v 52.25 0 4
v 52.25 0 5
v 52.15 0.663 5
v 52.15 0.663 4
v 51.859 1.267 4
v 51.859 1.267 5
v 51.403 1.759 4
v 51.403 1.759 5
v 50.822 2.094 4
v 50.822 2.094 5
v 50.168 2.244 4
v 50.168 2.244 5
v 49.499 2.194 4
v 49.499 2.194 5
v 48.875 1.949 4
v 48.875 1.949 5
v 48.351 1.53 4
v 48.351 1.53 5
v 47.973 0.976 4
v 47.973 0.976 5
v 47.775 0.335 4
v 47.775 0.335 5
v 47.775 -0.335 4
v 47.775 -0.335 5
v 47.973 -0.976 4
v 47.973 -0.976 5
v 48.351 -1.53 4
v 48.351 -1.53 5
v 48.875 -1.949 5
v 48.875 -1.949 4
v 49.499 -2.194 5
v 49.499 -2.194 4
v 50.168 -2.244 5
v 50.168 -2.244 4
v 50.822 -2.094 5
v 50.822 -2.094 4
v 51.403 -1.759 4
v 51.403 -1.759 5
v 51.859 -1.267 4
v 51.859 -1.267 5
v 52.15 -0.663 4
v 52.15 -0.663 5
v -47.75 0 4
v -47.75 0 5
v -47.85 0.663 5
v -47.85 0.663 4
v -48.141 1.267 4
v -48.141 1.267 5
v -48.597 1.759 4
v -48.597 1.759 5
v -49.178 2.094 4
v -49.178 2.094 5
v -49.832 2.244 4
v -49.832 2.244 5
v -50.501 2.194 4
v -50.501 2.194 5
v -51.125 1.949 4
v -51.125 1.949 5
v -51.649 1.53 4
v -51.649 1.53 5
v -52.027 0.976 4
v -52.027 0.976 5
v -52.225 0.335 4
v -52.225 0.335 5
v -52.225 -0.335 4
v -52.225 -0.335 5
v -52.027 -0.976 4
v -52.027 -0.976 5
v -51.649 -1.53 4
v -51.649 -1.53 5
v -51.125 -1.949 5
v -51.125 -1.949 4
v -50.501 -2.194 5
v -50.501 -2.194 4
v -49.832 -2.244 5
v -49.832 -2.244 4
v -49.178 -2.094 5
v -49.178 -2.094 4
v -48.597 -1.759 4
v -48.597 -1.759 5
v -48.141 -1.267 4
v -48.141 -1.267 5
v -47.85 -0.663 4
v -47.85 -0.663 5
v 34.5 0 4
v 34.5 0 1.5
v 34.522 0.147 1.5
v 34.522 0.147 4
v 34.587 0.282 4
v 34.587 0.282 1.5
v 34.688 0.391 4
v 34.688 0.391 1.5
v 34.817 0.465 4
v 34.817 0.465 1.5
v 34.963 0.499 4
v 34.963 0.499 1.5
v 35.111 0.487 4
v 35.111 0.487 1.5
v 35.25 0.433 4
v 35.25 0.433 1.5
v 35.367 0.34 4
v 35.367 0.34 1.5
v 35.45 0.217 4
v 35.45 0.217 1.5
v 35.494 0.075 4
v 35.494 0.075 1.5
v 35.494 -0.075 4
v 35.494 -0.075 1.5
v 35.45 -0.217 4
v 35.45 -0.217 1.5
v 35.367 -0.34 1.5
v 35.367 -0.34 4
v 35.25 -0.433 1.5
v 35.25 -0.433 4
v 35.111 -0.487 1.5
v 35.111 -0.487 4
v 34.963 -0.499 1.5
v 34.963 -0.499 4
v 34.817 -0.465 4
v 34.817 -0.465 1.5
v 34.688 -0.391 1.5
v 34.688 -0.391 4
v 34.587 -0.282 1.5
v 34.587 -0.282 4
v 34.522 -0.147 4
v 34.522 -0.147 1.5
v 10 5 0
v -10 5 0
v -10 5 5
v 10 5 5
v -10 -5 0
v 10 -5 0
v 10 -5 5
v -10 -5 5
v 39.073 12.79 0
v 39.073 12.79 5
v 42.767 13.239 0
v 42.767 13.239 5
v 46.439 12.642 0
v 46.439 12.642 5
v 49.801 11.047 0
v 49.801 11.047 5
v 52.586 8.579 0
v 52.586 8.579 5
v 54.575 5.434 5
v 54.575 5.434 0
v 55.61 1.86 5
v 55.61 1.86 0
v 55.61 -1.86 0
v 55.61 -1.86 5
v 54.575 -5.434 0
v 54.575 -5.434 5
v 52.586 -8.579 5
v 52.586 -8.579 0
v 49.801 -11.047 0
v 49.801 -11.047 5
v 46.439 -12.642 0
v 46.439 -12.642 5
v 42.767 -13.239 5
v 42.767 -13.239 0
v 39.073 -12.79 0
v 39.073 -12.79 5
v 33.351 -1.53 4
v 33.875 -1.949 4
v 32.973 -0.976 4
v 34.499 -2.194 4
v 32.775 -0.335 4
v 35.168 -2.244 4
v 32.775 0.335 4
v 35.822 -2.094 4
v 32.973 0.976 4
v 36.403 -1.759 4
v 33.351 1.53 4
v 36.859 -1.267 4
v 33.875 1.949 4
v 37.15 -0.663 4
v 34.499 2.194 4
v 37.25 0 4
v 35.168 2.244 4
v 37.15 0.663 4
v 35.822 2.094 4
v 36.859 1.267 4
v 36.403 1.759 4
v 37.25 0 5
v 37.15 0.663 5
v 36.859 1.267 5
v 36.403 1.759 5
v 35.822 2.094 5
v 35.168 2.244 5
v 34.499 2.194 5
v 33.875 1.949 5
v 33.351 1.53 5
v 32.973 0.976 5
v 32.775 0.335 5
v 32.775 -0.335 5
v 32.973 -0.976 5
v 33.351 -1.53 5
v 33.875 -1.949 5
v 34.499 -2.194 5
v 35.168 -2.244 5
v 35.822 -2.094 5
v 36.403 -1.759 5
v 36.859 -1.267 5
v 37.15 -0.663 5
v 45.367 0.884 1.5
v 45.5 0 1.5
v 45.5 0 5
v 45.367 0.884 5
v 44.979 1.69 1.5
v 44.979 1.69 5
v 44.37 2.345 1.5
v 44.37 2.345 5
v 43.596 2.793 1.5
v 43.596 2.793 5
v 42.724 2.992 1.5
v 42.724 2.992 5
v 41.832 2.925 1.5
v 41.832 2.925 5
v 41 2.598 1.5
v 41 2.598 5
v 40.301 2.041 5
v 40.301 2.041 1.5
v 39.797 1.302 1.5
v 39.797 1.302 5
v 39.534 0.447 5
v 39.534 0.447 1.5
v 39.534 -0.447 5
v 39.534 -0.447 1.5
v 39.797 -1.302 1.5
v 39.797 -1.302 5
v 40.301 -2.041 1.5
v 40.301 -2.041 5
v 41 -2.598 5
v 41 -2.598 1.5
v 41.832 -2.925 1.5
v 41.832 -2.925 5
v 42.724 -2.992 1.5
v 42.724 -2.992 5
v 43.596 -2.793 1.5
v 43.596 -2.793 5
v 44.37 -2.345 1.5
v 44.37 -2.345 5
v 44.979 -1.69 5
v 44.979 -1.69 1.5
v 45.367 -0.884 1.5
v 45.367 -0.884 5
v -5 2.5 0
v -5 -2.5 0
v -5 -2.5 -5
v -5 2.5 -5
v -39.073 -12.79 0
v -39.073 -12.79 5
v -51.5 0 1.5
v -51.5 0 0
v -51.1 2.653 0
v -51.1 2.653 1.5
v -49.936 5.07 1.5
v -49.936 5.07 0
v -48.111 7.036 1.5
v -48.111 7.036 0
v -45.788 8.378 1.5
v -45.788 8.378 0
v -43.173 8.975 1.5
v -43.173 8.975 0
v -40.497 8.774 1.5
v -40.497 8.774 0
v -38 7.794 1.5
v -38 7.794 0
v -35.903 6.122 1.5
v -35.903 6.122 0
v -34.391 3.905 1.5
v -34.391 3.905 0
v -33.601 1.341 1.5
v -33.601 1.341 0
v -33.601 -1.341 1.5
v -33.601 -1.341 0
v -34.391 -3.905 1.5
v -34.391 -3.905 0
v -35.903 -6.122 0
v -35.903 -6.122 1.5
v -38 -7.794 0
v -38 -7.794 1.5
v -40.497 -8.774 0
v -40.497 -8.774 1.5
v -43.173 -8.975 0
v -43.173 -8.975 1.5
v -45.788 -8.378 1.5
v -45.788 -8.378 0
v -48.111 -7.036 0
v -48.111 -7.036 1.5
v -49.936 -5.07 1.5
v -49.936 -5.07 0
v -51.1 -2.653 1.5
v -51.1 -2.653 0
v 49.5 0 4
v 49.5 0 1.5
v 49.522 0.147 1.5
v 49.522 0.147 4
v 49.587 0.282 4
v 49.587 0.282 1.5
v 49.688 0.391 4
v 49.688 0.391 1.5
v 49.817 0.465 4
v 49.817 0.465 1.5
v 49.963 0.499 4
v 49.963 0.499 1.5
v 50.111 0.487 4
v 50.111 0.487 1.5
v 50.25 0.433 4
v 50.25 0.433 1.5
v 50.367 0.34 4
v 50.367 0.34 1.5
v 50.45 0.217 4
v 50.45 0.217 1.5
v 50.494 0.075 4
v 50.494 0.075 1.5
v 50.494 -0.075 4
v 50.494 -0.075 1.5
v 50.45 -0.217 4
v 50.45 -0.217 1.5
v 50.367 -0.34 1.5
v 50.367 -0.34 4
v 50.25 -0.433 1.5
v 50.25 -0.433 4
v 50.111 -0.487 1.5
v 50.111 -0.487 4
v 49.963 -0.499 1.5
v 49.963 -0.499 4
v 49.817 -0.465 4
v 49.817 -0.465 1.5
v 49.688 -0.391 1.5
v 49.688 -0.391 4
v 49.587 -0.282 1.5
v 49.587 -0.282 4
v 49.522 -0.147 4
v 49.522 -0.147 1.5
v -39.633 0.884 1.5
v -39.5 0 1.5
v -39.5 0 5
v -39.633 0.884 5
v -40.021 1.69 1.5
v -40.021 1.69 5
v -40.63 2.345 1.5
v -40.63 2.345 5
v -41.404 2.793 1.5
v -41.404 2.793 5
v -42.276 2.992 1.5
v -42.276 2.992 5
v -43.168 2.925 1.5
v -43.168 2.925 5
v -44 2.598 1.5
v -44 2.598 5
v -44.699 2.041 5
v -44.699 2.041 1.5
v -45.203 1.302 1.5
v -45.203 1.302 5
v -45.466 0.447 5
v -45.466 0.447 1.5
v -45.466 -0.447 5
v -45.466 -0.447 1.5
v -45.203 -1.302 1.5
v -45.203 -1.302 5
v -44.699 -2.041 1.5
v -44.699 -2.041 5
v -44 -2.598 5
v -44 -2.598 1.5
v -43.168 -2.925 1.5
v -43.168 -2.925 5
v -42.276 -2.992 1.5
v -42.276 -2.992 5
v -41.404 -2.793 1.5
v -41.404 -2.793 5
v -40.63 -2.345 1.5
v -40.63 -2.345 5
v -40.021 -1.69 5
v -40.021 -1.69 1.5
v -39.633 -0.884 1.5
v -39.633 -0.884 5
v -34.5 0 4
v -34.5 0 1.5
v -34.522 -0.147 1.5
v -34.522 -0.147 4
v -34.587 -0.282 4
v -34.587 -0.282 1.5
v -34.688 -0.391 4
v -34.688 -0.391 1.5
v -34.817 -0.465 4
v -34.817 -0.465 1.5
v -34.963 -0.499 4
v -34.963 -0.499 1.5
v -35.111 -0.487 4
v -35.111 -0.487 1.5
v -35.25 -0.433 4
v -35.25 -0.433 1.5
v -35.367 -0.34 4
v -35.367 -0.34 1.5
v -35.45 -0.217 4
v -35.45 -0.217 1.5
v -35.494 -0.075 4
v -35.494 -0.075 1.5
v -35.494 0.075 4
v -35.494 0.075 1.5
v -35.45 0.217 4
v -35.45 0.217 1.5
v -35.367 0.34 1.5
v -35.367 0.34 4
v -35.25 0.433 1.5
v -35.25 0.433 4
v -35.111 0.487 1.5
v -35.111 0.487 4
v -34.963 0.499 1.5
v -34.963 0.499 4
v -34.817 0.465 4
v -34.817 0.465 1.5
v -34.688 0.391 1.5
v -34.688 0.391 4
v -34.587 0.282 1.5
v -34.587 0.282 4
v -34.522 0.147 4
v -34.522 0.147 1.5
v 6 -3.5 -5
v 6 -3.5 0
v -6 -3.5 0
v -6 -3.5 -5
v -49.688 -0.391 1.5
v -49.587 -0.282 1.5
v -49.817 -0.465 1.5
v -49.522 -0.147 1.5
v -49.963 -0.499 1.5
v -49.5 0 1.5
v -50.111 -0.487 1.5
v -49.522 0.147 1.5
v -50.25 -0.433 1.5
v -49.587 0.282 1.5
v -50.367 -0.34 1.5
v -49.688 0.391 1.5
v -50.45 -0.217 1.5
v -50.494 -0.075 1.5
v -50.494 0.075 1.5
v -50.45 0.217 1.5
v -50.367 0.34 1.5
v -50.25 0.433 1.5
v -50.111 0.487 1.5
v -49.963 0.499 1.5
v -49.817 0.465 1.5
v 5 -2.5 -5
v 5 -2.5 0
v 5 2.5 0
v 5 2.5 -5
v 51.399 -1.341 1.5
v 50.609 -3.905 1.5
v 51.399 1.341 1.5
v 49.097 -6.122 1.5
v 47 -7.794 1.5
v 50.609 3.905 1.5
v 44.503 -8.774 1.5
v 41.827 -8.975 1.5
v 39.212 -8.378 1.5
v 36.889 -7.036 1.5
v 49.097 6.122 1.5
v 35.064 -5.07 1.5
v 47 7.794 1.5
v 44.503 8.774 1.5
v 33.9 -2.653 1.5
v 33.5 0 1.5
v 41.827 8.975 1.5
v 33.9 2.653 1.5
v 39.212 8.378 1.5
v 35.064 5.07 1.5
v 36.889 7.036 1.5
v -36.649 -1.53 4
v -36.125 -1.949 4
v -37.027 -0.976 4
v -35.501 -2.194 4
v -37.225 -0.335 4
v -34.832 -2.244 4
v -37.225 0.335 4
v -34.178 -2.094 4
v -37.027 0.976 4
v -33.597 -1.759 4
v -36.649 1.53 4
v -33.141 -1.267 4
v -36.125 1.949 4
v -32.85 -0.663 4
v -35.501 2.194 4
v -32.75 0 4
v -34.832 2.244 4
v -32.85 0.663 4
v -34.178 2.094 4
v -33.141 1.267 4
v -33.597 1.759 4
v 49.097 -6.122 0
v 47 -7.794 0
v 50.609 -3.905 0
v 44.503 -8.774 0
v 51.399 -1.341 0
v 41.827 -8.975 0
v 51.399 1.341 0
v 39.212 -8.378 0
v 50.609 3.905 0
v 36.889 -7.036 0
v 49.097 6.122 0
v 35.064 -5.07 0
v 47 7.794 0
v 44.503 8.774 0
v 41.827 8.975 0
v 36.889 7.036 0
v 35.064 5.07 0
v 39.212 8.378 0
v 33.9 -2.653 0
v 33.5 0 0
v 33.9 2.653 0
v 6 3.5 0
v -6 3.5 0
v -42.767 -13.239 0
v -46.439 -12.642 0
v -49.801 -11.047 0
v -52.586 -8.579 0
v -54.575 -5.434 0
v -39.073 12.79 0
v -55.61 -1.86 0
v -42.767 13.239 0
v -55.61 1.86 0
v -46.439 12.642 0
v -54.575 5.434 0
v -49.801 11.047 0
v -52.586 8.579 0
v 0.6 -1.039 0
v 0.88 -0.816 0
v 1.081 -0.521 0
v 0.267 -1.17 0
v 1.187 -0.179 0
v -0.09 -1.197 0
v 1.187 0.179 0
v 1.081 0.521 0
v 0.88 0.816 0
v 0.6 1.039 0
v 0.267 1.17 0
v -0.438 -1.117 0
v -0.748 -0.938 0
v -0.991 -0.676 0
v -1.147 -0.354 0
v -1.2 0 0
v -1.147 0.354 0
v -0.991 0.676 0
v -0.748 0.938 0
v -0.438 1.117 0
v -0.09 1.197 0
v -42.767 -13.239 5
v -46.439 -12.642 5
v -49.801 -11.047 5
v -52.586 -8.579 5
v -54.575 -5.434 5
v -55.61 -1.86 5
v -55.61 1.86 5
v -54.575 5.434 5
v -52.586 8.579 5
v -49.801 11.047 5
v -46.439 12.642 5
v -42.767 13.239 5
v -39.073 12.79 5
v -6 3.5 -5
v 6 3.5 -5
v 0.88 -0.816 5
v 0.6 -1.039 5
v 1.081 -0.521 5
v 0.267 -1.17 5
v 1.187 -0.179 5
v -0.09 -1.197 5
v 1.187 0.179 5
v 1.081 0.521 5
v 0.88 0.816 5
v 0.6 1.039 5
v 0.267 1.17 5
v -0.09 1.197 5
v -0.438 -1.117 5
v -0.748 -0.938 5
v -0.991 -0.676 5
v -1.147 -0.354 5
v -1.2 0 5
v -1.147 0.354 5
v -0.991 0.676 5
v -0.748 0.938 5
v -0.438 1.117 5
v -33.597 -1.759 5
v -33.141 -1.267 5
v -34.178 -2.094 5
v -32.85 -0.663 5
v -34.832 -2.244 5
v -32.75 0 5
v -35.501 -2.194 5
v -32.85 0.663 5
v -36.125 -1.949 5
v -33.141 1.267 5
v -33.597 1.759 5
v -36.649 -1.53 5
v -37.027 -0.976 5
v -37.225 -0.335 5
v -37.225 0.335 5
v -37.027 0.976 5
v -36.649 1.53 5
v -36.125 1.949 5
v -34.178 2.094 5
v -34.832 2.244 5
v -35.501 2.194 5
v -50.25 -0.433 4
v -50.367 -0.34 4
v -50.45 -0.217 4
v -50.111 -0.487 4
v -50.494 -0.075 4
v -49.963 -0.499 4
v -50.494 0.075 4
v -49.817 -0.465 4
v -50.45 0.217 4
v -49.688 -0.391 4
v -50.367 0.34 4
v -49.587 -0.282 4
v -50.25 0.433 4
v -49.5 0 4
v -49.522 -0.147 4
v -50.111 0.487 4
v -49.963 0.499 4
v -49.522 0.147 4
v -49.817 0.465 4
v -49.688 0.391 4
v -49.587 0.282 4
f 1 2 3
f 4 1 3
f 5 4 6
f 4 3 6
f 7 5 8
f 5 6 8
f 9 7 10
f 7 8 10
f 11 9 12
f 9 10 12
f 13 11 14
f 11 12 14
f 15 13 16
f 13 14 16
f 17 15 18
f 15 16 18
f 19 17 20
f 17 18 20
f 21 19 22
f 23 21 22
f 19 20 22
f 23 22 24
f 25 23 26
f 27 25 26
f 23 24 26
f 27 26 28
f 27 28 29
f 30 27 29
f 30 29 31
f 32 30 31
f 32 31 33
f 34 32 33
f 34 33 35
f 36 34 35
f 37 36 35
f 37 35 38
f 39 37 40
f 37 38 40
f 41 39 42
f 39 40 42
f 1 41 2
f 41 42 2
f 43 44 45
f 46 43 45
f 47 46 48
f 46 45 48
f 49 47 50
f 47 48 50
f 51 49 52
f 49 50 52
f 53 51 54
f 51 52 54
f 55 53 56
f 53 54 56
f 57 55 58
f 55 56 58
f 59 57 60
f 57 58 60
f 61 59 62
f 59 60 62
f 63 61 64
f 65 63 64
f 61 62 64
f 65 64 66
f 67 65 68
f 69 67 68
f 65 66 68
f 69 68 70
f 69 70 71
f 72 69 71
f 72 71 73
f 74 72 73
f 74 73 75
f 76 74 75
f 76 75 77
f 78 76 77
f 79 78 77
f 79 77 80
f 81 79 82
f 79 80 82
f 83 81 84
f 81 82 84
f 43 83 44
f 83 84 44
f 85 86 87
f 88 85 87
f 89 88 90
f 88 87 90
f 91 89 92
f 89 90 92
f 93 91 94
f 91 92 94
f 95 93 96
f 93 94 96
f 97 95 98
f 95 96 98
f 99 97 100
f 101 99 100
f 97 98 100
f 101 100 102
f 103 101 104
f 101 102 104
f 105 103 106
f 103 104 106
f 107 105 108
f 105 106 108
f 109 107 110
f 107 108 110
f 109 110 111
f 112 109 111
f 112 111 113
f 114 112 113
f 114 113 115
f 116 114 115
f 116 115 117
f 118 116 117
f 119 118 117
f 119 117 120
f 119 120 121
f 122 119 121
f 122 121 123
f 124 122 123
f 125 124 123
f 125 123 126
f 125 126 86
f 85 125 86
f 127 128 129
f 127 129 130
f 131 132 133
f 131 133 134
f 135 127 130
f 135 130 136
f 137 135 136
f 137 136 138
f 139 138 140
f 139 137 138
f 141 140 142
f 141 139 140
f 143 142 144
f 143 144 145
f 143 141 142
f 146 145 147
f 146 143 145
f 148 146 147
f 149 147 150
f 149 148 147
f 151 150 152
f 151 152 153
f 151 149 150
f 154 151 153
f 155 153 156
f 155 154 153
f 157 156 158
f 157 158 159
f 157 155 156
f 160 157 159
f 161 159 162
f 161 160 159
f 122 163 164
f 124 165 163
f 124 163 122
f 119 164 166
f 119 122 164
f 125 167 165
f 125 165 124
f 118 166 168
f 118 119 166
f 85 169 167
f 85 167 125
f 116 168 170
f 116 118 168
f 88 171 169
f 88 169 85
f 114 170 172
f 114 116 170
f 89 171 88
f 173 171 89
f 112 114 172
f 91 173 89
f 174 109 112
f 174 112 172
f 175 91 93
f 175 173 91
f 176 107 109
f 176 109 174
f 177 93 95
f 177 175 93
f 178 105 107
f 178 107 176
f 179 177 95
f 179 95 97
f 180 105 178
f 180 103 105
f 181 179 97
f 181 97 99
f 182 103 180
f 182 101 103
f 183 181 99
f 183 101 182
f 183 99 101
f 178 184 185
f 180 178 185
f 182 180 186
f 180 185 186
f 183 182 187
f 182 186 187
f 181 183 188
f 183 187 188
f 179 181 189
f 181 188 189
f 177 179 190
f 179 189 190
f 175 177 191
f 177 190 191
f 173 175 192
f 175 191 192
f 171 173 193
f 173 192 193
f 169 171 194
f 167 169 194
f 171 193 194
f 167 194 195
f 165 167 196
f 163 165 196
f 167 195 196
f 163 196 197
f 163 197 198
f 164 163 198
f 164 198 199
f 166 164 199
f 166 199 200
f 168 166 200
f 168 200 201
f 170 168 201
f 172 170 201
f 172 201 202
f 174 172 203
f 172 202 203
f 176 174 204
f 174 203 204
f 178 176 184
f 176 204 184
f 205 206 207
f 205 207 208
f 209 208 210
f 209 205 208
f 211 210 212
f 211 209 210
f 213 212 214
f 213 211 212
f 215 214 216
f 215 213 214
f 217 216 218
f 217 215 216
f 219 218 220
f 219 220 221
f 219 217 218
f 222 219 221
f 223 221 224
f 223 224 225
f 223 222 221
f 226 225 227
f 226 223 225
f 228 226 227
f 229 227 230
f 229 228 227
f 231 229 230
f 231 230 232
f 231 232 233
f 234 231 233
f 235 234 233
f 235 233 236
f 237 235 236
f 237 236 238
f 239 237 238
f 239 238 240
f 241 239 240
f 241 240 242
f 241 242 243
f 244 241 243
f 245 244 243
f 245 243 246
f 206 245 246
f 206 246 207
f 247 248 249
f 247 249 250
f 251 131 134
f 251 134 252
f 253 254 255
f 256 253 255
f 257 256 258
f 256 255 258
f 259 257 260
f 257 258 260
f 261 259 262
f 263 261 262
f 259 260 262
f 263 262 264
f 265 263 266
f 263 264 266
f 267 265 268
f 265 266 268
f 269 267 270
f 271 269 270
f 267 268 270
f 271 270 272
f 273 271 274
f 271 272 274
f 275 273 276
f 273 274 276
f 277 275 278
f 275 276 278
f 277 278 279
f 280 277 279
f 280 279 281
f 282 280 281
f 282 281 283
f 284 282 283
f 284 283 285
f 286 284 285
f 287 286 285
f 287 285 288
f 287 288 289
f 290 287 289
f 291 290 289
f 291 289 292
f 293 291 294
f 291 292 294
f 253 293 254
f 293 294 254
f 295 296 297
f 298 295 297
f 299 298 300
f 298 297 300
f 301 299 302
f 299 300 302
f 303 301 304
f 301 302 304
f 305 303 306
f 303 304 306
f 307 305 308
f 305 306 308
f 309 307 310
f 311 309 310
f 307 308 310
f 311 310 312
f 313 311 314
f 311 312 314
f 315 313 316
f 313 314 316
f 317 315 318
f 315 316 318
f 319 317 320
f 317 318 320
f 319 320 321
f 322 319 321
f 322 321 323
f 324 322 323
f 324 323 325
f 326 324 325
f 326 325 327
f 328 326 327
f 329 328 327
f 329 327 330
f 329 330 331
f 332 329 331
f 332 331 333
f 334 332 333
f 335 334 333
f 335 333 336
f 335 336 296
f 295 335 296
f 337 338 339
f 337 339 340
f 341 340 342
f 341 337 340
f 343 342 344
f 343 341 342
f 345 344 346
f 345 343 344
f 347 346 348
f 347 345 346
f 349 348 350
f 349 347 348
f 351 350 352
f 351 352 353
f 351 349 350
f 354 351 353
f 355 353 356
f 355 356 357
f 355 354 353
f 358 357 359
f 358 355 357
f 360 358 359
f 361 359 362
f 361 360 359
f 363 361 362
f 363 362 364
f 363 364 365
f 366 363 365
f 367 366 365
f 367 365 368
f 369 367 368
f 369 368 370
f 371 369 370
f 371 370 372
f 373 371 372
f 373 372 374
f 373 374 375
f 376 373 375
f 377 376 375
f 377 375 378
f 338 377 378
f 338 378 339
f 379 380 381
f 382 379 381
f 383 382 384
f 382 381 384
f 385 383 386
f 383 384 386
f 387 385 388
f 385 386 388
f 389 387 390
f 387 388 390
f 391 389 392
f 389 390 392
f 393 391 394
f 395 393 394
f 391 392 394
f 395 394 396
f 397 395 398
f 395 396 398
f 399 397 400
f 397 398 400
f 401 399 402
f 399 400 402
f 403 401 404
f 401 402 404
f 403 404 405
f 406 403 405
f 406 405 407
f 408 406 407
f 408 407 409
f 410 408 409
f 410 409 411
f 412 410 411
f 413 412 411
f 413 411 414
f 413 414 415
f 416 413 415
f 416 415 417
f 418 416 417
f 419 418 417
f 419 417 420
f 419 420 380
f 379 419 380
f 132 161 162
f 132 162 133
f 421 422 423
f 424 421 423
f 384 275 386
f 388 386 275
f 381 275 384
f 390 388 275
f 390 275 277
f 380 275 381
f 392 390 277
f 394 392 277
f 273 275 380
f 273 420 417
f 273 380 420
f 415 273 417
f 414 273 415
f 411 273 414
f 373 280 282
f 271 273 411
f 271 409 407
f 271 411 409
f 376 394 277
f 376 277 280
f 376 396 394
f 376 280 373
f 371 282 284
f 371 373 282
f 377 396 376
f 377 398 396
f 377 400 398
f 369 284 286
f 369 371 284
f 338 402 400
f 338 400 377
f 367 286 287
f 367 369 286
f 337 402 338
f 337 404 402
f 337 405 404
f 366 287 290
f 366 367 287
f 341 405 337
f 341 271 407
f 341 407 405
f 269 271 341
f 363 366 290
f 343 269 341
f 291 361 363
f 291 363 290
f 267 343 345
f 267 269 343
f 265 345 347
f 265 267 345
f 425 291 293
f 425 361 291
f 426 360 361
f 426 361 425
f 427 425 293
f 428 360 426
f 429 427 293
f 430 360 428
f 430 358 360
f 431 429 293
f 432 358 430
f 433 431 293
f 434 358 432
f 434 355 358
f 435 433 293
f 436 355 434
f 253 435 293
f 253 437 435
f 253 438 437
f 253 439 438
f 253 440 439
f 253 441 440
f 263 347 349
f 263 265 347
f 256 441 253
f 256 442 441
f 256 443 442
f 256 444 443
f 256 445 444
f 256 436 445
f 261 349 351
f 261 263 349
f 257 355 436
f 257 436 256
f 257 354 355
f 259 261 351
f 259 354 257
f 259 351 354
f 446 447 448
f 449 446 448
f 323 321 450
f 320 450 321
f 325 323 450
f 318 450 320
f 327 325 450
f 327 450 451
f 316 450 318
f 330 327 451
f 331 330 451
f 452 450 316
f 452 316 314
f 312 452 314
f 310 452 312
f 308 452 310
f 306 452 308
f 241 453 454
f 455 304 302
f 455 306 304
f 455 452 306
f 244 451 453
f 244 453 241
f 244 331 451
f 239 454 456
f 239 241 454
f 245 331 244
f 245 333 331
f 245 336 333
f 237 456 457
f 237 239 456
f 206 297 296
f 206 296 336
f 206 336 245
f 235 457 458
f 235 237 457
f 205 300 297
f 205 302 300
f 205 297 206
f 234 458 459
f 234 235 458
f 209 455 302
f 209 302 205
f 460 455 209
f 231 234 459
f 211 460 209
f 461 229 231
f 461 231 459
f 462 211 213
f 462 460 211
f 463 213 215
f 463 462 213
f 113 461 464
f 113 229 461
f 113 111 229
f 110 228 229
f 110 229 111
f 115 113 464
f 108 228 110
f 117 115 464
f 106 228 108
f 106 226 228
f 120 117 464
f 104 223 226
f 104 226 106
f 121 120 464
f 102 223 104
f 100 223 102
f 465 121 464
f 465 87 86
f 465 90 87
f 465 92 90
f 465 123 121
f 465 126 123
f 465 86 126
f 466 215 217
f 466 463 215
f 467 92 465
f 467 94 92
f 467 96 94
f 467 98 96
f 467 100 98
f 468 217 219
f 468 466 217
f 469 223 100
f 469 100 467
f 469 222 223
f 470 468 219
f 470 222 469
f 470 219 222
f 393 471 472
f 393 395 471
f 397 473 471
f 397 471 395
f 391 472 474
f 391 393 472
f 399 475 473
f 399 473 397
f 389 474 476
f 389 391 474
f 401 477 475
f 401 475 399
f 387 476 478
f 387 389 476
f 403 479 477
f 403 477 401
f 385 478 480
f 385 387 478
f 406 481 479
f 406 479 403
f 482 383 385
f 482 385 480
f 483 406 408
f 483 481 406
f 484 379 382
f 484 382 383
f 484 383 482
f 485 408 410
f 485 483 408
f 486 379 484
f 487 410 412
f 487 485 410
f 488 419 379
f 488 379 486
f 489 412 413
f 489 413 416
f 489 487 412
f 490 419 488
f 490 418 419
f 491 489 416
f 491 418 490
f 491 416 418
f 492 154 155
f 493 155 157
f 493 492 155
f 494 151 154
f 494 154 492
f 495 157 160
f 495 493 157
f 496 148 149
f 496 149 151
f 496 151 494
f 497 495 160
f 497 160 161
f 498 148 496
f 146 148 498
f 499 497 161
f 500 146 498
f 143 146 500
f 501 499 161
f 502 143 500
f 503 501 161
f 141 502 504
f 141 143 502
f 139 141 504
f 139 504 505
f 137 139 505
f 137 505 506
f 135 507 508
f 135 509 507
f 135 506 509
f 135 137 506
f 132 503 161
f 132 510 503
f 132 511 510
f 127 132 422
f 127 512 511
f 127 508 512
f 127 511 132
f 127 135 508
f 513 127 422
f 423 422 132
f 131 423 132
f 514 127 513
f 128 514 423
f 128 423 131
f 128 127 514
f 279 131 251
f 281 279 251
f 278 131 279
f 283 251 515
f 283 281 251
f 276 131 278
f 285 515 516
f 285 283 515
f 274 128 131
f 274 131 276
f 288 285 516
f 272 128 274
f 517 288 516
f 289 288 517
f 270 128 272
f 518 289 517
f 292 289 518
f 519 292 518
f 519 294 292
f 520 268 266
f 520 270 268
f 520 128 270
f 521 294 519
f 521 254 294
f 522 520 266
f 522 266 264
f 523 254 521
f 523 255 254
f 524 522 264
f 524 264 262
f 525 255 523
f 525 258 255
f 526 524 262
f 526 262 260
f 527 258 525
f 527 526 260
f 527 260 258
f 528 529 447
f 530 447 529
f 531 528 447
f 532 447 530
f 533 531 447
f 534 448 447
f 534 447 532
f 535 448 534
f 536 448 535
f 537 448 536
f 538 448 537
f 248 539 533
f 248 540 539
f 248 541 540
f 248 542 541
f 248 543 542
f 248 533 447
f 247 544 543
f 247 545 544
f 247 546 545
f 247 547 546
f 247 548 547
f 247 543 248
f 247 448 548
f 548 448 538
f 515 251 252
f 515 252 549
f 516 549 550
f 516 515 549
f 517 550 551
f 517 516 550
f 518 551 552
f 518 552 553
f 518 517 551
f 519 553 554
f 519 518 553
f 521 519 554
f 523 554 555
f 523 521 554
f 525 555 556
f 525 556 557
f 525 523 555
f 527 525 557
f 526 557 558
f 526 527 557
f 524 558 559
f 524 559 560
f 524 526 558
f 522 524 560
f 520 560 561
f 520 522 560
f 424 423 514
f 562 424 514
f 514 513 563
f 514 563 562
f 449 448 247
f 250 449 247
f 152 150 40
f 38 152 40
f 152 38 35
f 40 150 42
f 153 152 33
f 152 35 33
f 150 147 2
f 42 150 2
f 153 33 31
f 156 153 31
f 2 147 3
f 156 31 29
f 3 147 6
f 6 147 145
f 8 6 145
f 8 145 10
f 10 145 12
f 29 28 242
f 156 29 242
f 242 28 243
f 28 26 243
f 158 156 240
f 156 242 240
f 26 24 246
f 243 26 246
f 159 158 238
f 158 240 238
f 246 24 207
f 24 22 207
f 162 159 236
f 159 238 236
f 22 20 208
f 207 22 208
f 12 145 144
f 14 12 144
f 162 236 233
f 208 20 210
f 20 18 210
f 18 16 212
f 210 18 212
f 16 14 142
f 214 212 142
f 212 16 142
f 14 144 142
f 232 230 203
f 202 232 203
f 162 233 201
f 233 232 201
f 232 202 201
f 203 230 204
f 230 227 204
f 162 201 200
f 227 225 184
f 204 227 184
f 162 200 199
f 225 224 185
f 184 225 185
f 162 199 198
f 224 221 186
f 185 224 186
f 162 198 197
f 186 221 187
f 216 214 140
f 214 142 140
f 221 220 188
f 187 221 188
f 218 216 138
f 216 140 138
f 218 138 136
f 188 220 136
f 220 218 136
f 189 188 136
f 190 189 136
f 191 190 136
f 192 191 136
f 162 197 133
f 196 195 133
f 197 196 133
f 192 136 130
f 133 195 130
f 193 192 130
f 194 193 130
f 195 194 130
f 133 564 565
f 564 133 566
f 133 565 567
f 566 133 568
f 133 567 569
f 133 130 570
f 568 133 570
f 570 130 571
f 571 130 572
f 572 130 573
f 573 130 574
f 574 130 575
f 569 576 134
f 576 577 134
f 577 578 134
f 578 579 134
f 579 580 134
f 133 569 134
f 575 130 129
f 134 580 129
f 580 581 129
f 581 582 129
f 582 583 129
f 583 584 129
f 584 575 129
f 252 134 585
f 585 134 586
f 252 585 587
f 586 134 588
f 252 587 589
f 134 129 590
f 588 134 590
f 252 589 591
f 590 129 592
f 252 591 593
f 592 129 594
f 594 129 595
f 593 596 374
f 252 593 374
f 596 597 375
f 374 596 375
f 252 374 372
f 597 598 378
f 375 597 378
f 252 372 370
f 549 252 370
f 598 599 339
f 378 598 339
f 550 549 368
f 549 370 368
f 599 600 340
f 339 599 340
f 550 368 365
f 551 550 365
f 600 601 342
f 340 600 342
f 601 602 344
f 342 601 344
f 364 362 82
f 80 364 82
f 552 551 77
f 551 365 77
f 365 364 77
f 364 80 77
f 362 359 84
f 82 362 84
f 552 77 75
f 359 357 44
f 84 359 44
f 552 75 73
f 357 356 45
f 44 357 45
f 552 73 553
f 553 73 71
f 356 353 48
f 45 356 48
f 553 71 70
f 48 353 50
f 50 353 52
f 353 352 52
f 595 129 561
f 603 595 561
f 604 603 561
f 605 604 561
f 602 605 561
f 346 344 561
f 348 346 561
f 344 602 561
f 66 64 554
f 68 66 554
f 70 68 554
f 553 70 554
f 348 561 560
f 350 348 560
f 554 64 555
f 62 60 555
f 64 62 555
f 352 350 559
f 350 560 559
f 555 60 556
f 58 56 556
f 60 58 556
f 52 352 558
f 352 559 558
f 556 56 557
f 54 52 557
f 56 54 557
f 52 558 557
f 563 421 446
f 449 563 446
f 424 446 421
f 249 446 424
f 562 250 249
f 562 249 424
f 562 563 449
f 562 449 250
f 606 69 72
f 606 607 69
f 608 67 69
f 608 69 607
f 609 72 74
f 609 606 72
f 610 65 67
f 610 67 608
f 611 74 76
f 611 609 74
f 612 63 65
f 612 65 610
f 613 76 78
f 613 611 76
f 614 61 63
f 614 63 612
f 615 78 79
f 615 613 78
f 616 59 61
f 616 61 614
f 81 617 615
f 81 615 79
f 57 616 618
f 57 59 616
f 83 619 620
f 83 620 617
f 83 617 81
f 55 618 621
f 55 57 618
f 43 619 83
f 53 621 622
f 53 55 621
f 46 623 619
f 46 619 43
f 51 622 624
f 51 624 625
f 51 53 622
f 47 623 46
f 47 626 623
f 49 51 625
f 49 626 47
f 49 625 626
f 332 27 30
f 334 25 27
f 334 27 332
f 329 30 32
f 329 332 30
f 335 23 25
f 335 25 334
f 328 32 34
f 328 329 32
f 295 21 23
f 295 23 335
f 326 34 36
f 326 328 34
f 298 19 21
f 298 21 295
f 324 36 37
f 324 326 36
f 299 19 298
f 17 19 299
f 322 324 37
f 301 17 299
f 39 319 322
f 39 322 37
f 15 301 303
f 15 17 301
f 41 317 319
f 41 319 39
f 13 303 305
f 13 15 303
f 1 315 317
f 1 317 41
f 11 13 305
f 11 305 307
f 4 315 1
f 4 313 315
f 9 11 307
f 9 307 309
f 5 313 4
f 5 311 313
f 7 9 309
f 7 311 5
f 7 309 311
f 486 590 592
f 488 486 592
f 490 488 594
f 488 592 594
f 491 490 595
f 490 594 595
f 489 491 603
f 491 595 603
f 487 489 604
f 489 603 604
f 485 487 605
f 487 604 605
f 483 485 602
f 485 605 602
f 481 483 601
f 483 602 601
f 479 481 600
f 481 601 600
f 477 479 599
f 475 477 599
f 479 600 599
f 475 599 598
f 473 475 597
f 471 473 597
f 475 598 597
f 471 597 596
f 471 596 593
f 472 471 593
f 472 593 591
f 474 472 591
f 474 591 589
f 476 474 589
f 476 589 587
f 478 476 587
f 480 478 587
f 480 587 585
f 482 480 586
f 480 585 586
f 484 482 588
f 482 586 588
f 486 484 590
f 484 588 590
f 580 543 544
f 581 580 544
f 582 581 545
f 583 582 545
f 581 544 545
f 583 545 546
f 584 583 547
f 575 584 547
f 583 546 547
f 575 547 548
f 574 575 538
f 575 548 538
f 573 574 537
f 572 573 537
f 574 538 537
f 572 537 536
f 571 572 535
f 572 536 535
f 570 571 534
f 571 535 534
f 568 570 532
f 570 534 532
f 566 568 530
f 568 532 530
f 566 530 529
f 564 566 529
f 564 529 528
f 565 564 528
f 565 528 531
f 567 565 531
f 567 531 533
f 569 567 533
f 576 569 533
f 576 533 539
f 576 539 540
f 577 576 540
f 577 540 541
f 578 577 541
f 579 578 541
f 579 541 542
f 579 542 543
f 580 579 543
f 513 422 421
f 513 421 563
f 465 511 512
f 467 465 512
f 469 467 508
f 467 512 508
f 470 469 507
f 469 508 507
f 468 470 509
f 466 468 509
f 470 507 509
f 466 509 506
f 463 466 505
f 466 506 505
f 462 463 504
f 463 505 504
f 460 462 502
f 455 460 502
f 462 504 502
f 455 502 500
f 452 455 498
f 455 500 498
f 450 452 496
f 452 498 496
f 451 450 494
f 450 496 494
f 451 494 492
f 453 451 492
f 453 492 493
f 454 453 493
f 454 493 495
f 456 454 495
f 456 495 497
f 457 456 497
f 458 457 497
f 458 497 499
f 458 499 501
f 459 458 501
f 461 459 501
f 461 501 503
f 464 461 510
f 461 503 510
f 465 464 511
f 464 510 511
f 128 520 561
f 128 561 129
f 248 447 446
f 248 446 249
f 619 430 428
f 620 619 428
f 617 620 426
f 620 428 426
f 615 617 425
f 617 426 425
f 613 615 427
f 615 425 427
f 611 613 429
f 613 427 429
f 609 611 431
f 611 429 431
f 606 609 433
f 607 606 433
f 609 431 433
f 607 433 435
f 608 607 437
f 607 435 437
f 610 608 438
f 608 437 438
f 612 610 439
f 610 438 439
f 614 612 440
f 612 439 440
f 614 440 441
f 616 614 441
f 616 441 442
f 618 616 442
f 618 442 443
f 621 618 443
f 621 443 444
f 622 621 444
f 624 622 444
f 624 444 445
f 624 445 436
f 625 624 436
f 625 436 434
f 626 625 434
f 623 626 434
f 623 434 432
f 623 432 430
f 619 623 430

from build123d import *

# Parameters (mm, degrees)
SKETCH_1_R          = 3
EXTRUDE_1_DEPTH     = 5
SKETCH_3_W          = 12
SKETCH_3_H          = 7
SKETCH_3_W_2        = 10
SKETCH_3_H_2        = 5
EXTRUDE_1_2_DEPTH   = 5
CUT_EXTRUDE_2_REACH = 59.51
SKETCH_4_R          = 1.2
SKETCH_5_R          = 9
CUT_EXTRUDE_3_DEPTH = 1.5
SKETCH_6_R          = 0.5
CUT_EXTRUDE_4_DEPTH = 5
SKETCH_7_R          = 2.25
CUT_EXTRUDE_5_DEPTH = 1


with BuildPart() as part:
    # 草图1 → Extrude 1 (new body)
    with BuildSketch(Plane.XY):
        with BuildLine():
            Line((-10, 5), (10, 5))
            Line((10, 5), (39.072912811, 12.790063509))
            ThreePointArc((39.072912811, 12.790063509), (55.741248097, 0), (39.072912811, -12.790063509))
            Line((39.072912811, -12.790063509), (10, -5))
            Line((10, -5), (-10, -5))
            Line((-10, -5), (-39.072912811, -12.790063509))
            ThreePointArc((-39.072912811, -12.790063509), (-55.741248097, 0), (-39.072912811, 12.790063509))
            Line((-39.072912811, 12.790063509), (-10, 5))
        make_face()
        with Locations((-42.5, 0)):
            Circle(SKETCH_1_R, mode=Mode.SUBTRACT)
        with Locations((42.5, 0)):
            Circle(SKETCH_1_R, mode=Mode.SUBTRACT)
    extrude(amount=EXTRUDE_1_DEPTH)

    # 草图3 → Extrude 1 2 (add)
    with BuildSketch(Plane(origin=(0, 0, 0), x_dir=(-1, 0, 0), z_dir=(0, 0, -1))):
        Rectangle(SKETCH_3_W, SKETCH_3_H)
        Rectangle(SKETCH_3_W_2, SKETCH_3_H_2, mode=Mode.SUBTRACT)
    extrude(amount=EXTRUDE_1_2_DEPTH)

    # 草图4 → 切除-拉伸2 (cut, up to next)
    with BuildSketch(Plane(origin=(0, 0, 0), x_dir=(-1, 0, 0), z_dir=(0, 0, -1)), mode=Mode.PRIVATE) as cut_extrude_2_sk1:
        Circle(SKETCH_4_R)
    cut_extrude_2_tool1 = extrude(cut_extrude_2_sk1.sketch, amount=-CUT_EXTRUDE_2_REACH, mode=Mode.PRIVATE) & part.part
    add(cut_extrude_2_tool1.solids().sort_by_distance((0, 0, 0))[0], mode=Mode.SUBTRACT)

    # 草图5 → 切除-拉伸3 (cut)
    with BuildSketch(Plane(origin=(0, 0, 0), x_dir=(-1, 0, 0), z_dir=(0, 0, -1))):
        with Locations((-42.5, 0)):
            Circle(SKETCH_5_R)
        with Locations((42.5, 0)):
            Circle(SKETCH_5_R)
    extrude(amount=-CUT_EXTRUDE_3_DEPTH, mode=Mode.SUBTRACT)

    # 草图6 → 切除-拉伸4 (cut)
    with BuildSketch(Plane(origin=(0, 0, 1.5), x_dir=(-1, 0, 0), z_dir=(0, 0, -1))):
        with Locations((-50, 0)):
            Circle(SKETCH_6_R)
        with Locations((-35, 0)):
            Circle(SKETCH_6_R)
        with Locations(Location((35, 0, 0), (0, 0, 180))):
            Circle(SKETCH_6_R)
        with Locations(Location((50, 0, 0), (0, 0, 180))):
            Circle(SKETCH_6_R)
    extrude(amount=-CUT_EXTRUDE_4_DEPTH, mode=Mode.SUBTRACT)

    # 草图7 → 切除-拉伸5 (cut)
    with BuildSketch(Plane.XY.offset(5)):
        with Locations((-50, 0)):
            Circle(SKETCH_7_R)
        with Locations((-35, 0)):
            Circle(SKETCH_7_R)
        with Locations((35, 0)):
            Circle(SKETCH_7_R)
        with Locations((50, 0)):
            Circle(SKETCH_7_R)
    extrude(amount=-CUT_EXTRUDE_5_DEPTH, mode=Mode.SUBTRACT)


solid = part.part
